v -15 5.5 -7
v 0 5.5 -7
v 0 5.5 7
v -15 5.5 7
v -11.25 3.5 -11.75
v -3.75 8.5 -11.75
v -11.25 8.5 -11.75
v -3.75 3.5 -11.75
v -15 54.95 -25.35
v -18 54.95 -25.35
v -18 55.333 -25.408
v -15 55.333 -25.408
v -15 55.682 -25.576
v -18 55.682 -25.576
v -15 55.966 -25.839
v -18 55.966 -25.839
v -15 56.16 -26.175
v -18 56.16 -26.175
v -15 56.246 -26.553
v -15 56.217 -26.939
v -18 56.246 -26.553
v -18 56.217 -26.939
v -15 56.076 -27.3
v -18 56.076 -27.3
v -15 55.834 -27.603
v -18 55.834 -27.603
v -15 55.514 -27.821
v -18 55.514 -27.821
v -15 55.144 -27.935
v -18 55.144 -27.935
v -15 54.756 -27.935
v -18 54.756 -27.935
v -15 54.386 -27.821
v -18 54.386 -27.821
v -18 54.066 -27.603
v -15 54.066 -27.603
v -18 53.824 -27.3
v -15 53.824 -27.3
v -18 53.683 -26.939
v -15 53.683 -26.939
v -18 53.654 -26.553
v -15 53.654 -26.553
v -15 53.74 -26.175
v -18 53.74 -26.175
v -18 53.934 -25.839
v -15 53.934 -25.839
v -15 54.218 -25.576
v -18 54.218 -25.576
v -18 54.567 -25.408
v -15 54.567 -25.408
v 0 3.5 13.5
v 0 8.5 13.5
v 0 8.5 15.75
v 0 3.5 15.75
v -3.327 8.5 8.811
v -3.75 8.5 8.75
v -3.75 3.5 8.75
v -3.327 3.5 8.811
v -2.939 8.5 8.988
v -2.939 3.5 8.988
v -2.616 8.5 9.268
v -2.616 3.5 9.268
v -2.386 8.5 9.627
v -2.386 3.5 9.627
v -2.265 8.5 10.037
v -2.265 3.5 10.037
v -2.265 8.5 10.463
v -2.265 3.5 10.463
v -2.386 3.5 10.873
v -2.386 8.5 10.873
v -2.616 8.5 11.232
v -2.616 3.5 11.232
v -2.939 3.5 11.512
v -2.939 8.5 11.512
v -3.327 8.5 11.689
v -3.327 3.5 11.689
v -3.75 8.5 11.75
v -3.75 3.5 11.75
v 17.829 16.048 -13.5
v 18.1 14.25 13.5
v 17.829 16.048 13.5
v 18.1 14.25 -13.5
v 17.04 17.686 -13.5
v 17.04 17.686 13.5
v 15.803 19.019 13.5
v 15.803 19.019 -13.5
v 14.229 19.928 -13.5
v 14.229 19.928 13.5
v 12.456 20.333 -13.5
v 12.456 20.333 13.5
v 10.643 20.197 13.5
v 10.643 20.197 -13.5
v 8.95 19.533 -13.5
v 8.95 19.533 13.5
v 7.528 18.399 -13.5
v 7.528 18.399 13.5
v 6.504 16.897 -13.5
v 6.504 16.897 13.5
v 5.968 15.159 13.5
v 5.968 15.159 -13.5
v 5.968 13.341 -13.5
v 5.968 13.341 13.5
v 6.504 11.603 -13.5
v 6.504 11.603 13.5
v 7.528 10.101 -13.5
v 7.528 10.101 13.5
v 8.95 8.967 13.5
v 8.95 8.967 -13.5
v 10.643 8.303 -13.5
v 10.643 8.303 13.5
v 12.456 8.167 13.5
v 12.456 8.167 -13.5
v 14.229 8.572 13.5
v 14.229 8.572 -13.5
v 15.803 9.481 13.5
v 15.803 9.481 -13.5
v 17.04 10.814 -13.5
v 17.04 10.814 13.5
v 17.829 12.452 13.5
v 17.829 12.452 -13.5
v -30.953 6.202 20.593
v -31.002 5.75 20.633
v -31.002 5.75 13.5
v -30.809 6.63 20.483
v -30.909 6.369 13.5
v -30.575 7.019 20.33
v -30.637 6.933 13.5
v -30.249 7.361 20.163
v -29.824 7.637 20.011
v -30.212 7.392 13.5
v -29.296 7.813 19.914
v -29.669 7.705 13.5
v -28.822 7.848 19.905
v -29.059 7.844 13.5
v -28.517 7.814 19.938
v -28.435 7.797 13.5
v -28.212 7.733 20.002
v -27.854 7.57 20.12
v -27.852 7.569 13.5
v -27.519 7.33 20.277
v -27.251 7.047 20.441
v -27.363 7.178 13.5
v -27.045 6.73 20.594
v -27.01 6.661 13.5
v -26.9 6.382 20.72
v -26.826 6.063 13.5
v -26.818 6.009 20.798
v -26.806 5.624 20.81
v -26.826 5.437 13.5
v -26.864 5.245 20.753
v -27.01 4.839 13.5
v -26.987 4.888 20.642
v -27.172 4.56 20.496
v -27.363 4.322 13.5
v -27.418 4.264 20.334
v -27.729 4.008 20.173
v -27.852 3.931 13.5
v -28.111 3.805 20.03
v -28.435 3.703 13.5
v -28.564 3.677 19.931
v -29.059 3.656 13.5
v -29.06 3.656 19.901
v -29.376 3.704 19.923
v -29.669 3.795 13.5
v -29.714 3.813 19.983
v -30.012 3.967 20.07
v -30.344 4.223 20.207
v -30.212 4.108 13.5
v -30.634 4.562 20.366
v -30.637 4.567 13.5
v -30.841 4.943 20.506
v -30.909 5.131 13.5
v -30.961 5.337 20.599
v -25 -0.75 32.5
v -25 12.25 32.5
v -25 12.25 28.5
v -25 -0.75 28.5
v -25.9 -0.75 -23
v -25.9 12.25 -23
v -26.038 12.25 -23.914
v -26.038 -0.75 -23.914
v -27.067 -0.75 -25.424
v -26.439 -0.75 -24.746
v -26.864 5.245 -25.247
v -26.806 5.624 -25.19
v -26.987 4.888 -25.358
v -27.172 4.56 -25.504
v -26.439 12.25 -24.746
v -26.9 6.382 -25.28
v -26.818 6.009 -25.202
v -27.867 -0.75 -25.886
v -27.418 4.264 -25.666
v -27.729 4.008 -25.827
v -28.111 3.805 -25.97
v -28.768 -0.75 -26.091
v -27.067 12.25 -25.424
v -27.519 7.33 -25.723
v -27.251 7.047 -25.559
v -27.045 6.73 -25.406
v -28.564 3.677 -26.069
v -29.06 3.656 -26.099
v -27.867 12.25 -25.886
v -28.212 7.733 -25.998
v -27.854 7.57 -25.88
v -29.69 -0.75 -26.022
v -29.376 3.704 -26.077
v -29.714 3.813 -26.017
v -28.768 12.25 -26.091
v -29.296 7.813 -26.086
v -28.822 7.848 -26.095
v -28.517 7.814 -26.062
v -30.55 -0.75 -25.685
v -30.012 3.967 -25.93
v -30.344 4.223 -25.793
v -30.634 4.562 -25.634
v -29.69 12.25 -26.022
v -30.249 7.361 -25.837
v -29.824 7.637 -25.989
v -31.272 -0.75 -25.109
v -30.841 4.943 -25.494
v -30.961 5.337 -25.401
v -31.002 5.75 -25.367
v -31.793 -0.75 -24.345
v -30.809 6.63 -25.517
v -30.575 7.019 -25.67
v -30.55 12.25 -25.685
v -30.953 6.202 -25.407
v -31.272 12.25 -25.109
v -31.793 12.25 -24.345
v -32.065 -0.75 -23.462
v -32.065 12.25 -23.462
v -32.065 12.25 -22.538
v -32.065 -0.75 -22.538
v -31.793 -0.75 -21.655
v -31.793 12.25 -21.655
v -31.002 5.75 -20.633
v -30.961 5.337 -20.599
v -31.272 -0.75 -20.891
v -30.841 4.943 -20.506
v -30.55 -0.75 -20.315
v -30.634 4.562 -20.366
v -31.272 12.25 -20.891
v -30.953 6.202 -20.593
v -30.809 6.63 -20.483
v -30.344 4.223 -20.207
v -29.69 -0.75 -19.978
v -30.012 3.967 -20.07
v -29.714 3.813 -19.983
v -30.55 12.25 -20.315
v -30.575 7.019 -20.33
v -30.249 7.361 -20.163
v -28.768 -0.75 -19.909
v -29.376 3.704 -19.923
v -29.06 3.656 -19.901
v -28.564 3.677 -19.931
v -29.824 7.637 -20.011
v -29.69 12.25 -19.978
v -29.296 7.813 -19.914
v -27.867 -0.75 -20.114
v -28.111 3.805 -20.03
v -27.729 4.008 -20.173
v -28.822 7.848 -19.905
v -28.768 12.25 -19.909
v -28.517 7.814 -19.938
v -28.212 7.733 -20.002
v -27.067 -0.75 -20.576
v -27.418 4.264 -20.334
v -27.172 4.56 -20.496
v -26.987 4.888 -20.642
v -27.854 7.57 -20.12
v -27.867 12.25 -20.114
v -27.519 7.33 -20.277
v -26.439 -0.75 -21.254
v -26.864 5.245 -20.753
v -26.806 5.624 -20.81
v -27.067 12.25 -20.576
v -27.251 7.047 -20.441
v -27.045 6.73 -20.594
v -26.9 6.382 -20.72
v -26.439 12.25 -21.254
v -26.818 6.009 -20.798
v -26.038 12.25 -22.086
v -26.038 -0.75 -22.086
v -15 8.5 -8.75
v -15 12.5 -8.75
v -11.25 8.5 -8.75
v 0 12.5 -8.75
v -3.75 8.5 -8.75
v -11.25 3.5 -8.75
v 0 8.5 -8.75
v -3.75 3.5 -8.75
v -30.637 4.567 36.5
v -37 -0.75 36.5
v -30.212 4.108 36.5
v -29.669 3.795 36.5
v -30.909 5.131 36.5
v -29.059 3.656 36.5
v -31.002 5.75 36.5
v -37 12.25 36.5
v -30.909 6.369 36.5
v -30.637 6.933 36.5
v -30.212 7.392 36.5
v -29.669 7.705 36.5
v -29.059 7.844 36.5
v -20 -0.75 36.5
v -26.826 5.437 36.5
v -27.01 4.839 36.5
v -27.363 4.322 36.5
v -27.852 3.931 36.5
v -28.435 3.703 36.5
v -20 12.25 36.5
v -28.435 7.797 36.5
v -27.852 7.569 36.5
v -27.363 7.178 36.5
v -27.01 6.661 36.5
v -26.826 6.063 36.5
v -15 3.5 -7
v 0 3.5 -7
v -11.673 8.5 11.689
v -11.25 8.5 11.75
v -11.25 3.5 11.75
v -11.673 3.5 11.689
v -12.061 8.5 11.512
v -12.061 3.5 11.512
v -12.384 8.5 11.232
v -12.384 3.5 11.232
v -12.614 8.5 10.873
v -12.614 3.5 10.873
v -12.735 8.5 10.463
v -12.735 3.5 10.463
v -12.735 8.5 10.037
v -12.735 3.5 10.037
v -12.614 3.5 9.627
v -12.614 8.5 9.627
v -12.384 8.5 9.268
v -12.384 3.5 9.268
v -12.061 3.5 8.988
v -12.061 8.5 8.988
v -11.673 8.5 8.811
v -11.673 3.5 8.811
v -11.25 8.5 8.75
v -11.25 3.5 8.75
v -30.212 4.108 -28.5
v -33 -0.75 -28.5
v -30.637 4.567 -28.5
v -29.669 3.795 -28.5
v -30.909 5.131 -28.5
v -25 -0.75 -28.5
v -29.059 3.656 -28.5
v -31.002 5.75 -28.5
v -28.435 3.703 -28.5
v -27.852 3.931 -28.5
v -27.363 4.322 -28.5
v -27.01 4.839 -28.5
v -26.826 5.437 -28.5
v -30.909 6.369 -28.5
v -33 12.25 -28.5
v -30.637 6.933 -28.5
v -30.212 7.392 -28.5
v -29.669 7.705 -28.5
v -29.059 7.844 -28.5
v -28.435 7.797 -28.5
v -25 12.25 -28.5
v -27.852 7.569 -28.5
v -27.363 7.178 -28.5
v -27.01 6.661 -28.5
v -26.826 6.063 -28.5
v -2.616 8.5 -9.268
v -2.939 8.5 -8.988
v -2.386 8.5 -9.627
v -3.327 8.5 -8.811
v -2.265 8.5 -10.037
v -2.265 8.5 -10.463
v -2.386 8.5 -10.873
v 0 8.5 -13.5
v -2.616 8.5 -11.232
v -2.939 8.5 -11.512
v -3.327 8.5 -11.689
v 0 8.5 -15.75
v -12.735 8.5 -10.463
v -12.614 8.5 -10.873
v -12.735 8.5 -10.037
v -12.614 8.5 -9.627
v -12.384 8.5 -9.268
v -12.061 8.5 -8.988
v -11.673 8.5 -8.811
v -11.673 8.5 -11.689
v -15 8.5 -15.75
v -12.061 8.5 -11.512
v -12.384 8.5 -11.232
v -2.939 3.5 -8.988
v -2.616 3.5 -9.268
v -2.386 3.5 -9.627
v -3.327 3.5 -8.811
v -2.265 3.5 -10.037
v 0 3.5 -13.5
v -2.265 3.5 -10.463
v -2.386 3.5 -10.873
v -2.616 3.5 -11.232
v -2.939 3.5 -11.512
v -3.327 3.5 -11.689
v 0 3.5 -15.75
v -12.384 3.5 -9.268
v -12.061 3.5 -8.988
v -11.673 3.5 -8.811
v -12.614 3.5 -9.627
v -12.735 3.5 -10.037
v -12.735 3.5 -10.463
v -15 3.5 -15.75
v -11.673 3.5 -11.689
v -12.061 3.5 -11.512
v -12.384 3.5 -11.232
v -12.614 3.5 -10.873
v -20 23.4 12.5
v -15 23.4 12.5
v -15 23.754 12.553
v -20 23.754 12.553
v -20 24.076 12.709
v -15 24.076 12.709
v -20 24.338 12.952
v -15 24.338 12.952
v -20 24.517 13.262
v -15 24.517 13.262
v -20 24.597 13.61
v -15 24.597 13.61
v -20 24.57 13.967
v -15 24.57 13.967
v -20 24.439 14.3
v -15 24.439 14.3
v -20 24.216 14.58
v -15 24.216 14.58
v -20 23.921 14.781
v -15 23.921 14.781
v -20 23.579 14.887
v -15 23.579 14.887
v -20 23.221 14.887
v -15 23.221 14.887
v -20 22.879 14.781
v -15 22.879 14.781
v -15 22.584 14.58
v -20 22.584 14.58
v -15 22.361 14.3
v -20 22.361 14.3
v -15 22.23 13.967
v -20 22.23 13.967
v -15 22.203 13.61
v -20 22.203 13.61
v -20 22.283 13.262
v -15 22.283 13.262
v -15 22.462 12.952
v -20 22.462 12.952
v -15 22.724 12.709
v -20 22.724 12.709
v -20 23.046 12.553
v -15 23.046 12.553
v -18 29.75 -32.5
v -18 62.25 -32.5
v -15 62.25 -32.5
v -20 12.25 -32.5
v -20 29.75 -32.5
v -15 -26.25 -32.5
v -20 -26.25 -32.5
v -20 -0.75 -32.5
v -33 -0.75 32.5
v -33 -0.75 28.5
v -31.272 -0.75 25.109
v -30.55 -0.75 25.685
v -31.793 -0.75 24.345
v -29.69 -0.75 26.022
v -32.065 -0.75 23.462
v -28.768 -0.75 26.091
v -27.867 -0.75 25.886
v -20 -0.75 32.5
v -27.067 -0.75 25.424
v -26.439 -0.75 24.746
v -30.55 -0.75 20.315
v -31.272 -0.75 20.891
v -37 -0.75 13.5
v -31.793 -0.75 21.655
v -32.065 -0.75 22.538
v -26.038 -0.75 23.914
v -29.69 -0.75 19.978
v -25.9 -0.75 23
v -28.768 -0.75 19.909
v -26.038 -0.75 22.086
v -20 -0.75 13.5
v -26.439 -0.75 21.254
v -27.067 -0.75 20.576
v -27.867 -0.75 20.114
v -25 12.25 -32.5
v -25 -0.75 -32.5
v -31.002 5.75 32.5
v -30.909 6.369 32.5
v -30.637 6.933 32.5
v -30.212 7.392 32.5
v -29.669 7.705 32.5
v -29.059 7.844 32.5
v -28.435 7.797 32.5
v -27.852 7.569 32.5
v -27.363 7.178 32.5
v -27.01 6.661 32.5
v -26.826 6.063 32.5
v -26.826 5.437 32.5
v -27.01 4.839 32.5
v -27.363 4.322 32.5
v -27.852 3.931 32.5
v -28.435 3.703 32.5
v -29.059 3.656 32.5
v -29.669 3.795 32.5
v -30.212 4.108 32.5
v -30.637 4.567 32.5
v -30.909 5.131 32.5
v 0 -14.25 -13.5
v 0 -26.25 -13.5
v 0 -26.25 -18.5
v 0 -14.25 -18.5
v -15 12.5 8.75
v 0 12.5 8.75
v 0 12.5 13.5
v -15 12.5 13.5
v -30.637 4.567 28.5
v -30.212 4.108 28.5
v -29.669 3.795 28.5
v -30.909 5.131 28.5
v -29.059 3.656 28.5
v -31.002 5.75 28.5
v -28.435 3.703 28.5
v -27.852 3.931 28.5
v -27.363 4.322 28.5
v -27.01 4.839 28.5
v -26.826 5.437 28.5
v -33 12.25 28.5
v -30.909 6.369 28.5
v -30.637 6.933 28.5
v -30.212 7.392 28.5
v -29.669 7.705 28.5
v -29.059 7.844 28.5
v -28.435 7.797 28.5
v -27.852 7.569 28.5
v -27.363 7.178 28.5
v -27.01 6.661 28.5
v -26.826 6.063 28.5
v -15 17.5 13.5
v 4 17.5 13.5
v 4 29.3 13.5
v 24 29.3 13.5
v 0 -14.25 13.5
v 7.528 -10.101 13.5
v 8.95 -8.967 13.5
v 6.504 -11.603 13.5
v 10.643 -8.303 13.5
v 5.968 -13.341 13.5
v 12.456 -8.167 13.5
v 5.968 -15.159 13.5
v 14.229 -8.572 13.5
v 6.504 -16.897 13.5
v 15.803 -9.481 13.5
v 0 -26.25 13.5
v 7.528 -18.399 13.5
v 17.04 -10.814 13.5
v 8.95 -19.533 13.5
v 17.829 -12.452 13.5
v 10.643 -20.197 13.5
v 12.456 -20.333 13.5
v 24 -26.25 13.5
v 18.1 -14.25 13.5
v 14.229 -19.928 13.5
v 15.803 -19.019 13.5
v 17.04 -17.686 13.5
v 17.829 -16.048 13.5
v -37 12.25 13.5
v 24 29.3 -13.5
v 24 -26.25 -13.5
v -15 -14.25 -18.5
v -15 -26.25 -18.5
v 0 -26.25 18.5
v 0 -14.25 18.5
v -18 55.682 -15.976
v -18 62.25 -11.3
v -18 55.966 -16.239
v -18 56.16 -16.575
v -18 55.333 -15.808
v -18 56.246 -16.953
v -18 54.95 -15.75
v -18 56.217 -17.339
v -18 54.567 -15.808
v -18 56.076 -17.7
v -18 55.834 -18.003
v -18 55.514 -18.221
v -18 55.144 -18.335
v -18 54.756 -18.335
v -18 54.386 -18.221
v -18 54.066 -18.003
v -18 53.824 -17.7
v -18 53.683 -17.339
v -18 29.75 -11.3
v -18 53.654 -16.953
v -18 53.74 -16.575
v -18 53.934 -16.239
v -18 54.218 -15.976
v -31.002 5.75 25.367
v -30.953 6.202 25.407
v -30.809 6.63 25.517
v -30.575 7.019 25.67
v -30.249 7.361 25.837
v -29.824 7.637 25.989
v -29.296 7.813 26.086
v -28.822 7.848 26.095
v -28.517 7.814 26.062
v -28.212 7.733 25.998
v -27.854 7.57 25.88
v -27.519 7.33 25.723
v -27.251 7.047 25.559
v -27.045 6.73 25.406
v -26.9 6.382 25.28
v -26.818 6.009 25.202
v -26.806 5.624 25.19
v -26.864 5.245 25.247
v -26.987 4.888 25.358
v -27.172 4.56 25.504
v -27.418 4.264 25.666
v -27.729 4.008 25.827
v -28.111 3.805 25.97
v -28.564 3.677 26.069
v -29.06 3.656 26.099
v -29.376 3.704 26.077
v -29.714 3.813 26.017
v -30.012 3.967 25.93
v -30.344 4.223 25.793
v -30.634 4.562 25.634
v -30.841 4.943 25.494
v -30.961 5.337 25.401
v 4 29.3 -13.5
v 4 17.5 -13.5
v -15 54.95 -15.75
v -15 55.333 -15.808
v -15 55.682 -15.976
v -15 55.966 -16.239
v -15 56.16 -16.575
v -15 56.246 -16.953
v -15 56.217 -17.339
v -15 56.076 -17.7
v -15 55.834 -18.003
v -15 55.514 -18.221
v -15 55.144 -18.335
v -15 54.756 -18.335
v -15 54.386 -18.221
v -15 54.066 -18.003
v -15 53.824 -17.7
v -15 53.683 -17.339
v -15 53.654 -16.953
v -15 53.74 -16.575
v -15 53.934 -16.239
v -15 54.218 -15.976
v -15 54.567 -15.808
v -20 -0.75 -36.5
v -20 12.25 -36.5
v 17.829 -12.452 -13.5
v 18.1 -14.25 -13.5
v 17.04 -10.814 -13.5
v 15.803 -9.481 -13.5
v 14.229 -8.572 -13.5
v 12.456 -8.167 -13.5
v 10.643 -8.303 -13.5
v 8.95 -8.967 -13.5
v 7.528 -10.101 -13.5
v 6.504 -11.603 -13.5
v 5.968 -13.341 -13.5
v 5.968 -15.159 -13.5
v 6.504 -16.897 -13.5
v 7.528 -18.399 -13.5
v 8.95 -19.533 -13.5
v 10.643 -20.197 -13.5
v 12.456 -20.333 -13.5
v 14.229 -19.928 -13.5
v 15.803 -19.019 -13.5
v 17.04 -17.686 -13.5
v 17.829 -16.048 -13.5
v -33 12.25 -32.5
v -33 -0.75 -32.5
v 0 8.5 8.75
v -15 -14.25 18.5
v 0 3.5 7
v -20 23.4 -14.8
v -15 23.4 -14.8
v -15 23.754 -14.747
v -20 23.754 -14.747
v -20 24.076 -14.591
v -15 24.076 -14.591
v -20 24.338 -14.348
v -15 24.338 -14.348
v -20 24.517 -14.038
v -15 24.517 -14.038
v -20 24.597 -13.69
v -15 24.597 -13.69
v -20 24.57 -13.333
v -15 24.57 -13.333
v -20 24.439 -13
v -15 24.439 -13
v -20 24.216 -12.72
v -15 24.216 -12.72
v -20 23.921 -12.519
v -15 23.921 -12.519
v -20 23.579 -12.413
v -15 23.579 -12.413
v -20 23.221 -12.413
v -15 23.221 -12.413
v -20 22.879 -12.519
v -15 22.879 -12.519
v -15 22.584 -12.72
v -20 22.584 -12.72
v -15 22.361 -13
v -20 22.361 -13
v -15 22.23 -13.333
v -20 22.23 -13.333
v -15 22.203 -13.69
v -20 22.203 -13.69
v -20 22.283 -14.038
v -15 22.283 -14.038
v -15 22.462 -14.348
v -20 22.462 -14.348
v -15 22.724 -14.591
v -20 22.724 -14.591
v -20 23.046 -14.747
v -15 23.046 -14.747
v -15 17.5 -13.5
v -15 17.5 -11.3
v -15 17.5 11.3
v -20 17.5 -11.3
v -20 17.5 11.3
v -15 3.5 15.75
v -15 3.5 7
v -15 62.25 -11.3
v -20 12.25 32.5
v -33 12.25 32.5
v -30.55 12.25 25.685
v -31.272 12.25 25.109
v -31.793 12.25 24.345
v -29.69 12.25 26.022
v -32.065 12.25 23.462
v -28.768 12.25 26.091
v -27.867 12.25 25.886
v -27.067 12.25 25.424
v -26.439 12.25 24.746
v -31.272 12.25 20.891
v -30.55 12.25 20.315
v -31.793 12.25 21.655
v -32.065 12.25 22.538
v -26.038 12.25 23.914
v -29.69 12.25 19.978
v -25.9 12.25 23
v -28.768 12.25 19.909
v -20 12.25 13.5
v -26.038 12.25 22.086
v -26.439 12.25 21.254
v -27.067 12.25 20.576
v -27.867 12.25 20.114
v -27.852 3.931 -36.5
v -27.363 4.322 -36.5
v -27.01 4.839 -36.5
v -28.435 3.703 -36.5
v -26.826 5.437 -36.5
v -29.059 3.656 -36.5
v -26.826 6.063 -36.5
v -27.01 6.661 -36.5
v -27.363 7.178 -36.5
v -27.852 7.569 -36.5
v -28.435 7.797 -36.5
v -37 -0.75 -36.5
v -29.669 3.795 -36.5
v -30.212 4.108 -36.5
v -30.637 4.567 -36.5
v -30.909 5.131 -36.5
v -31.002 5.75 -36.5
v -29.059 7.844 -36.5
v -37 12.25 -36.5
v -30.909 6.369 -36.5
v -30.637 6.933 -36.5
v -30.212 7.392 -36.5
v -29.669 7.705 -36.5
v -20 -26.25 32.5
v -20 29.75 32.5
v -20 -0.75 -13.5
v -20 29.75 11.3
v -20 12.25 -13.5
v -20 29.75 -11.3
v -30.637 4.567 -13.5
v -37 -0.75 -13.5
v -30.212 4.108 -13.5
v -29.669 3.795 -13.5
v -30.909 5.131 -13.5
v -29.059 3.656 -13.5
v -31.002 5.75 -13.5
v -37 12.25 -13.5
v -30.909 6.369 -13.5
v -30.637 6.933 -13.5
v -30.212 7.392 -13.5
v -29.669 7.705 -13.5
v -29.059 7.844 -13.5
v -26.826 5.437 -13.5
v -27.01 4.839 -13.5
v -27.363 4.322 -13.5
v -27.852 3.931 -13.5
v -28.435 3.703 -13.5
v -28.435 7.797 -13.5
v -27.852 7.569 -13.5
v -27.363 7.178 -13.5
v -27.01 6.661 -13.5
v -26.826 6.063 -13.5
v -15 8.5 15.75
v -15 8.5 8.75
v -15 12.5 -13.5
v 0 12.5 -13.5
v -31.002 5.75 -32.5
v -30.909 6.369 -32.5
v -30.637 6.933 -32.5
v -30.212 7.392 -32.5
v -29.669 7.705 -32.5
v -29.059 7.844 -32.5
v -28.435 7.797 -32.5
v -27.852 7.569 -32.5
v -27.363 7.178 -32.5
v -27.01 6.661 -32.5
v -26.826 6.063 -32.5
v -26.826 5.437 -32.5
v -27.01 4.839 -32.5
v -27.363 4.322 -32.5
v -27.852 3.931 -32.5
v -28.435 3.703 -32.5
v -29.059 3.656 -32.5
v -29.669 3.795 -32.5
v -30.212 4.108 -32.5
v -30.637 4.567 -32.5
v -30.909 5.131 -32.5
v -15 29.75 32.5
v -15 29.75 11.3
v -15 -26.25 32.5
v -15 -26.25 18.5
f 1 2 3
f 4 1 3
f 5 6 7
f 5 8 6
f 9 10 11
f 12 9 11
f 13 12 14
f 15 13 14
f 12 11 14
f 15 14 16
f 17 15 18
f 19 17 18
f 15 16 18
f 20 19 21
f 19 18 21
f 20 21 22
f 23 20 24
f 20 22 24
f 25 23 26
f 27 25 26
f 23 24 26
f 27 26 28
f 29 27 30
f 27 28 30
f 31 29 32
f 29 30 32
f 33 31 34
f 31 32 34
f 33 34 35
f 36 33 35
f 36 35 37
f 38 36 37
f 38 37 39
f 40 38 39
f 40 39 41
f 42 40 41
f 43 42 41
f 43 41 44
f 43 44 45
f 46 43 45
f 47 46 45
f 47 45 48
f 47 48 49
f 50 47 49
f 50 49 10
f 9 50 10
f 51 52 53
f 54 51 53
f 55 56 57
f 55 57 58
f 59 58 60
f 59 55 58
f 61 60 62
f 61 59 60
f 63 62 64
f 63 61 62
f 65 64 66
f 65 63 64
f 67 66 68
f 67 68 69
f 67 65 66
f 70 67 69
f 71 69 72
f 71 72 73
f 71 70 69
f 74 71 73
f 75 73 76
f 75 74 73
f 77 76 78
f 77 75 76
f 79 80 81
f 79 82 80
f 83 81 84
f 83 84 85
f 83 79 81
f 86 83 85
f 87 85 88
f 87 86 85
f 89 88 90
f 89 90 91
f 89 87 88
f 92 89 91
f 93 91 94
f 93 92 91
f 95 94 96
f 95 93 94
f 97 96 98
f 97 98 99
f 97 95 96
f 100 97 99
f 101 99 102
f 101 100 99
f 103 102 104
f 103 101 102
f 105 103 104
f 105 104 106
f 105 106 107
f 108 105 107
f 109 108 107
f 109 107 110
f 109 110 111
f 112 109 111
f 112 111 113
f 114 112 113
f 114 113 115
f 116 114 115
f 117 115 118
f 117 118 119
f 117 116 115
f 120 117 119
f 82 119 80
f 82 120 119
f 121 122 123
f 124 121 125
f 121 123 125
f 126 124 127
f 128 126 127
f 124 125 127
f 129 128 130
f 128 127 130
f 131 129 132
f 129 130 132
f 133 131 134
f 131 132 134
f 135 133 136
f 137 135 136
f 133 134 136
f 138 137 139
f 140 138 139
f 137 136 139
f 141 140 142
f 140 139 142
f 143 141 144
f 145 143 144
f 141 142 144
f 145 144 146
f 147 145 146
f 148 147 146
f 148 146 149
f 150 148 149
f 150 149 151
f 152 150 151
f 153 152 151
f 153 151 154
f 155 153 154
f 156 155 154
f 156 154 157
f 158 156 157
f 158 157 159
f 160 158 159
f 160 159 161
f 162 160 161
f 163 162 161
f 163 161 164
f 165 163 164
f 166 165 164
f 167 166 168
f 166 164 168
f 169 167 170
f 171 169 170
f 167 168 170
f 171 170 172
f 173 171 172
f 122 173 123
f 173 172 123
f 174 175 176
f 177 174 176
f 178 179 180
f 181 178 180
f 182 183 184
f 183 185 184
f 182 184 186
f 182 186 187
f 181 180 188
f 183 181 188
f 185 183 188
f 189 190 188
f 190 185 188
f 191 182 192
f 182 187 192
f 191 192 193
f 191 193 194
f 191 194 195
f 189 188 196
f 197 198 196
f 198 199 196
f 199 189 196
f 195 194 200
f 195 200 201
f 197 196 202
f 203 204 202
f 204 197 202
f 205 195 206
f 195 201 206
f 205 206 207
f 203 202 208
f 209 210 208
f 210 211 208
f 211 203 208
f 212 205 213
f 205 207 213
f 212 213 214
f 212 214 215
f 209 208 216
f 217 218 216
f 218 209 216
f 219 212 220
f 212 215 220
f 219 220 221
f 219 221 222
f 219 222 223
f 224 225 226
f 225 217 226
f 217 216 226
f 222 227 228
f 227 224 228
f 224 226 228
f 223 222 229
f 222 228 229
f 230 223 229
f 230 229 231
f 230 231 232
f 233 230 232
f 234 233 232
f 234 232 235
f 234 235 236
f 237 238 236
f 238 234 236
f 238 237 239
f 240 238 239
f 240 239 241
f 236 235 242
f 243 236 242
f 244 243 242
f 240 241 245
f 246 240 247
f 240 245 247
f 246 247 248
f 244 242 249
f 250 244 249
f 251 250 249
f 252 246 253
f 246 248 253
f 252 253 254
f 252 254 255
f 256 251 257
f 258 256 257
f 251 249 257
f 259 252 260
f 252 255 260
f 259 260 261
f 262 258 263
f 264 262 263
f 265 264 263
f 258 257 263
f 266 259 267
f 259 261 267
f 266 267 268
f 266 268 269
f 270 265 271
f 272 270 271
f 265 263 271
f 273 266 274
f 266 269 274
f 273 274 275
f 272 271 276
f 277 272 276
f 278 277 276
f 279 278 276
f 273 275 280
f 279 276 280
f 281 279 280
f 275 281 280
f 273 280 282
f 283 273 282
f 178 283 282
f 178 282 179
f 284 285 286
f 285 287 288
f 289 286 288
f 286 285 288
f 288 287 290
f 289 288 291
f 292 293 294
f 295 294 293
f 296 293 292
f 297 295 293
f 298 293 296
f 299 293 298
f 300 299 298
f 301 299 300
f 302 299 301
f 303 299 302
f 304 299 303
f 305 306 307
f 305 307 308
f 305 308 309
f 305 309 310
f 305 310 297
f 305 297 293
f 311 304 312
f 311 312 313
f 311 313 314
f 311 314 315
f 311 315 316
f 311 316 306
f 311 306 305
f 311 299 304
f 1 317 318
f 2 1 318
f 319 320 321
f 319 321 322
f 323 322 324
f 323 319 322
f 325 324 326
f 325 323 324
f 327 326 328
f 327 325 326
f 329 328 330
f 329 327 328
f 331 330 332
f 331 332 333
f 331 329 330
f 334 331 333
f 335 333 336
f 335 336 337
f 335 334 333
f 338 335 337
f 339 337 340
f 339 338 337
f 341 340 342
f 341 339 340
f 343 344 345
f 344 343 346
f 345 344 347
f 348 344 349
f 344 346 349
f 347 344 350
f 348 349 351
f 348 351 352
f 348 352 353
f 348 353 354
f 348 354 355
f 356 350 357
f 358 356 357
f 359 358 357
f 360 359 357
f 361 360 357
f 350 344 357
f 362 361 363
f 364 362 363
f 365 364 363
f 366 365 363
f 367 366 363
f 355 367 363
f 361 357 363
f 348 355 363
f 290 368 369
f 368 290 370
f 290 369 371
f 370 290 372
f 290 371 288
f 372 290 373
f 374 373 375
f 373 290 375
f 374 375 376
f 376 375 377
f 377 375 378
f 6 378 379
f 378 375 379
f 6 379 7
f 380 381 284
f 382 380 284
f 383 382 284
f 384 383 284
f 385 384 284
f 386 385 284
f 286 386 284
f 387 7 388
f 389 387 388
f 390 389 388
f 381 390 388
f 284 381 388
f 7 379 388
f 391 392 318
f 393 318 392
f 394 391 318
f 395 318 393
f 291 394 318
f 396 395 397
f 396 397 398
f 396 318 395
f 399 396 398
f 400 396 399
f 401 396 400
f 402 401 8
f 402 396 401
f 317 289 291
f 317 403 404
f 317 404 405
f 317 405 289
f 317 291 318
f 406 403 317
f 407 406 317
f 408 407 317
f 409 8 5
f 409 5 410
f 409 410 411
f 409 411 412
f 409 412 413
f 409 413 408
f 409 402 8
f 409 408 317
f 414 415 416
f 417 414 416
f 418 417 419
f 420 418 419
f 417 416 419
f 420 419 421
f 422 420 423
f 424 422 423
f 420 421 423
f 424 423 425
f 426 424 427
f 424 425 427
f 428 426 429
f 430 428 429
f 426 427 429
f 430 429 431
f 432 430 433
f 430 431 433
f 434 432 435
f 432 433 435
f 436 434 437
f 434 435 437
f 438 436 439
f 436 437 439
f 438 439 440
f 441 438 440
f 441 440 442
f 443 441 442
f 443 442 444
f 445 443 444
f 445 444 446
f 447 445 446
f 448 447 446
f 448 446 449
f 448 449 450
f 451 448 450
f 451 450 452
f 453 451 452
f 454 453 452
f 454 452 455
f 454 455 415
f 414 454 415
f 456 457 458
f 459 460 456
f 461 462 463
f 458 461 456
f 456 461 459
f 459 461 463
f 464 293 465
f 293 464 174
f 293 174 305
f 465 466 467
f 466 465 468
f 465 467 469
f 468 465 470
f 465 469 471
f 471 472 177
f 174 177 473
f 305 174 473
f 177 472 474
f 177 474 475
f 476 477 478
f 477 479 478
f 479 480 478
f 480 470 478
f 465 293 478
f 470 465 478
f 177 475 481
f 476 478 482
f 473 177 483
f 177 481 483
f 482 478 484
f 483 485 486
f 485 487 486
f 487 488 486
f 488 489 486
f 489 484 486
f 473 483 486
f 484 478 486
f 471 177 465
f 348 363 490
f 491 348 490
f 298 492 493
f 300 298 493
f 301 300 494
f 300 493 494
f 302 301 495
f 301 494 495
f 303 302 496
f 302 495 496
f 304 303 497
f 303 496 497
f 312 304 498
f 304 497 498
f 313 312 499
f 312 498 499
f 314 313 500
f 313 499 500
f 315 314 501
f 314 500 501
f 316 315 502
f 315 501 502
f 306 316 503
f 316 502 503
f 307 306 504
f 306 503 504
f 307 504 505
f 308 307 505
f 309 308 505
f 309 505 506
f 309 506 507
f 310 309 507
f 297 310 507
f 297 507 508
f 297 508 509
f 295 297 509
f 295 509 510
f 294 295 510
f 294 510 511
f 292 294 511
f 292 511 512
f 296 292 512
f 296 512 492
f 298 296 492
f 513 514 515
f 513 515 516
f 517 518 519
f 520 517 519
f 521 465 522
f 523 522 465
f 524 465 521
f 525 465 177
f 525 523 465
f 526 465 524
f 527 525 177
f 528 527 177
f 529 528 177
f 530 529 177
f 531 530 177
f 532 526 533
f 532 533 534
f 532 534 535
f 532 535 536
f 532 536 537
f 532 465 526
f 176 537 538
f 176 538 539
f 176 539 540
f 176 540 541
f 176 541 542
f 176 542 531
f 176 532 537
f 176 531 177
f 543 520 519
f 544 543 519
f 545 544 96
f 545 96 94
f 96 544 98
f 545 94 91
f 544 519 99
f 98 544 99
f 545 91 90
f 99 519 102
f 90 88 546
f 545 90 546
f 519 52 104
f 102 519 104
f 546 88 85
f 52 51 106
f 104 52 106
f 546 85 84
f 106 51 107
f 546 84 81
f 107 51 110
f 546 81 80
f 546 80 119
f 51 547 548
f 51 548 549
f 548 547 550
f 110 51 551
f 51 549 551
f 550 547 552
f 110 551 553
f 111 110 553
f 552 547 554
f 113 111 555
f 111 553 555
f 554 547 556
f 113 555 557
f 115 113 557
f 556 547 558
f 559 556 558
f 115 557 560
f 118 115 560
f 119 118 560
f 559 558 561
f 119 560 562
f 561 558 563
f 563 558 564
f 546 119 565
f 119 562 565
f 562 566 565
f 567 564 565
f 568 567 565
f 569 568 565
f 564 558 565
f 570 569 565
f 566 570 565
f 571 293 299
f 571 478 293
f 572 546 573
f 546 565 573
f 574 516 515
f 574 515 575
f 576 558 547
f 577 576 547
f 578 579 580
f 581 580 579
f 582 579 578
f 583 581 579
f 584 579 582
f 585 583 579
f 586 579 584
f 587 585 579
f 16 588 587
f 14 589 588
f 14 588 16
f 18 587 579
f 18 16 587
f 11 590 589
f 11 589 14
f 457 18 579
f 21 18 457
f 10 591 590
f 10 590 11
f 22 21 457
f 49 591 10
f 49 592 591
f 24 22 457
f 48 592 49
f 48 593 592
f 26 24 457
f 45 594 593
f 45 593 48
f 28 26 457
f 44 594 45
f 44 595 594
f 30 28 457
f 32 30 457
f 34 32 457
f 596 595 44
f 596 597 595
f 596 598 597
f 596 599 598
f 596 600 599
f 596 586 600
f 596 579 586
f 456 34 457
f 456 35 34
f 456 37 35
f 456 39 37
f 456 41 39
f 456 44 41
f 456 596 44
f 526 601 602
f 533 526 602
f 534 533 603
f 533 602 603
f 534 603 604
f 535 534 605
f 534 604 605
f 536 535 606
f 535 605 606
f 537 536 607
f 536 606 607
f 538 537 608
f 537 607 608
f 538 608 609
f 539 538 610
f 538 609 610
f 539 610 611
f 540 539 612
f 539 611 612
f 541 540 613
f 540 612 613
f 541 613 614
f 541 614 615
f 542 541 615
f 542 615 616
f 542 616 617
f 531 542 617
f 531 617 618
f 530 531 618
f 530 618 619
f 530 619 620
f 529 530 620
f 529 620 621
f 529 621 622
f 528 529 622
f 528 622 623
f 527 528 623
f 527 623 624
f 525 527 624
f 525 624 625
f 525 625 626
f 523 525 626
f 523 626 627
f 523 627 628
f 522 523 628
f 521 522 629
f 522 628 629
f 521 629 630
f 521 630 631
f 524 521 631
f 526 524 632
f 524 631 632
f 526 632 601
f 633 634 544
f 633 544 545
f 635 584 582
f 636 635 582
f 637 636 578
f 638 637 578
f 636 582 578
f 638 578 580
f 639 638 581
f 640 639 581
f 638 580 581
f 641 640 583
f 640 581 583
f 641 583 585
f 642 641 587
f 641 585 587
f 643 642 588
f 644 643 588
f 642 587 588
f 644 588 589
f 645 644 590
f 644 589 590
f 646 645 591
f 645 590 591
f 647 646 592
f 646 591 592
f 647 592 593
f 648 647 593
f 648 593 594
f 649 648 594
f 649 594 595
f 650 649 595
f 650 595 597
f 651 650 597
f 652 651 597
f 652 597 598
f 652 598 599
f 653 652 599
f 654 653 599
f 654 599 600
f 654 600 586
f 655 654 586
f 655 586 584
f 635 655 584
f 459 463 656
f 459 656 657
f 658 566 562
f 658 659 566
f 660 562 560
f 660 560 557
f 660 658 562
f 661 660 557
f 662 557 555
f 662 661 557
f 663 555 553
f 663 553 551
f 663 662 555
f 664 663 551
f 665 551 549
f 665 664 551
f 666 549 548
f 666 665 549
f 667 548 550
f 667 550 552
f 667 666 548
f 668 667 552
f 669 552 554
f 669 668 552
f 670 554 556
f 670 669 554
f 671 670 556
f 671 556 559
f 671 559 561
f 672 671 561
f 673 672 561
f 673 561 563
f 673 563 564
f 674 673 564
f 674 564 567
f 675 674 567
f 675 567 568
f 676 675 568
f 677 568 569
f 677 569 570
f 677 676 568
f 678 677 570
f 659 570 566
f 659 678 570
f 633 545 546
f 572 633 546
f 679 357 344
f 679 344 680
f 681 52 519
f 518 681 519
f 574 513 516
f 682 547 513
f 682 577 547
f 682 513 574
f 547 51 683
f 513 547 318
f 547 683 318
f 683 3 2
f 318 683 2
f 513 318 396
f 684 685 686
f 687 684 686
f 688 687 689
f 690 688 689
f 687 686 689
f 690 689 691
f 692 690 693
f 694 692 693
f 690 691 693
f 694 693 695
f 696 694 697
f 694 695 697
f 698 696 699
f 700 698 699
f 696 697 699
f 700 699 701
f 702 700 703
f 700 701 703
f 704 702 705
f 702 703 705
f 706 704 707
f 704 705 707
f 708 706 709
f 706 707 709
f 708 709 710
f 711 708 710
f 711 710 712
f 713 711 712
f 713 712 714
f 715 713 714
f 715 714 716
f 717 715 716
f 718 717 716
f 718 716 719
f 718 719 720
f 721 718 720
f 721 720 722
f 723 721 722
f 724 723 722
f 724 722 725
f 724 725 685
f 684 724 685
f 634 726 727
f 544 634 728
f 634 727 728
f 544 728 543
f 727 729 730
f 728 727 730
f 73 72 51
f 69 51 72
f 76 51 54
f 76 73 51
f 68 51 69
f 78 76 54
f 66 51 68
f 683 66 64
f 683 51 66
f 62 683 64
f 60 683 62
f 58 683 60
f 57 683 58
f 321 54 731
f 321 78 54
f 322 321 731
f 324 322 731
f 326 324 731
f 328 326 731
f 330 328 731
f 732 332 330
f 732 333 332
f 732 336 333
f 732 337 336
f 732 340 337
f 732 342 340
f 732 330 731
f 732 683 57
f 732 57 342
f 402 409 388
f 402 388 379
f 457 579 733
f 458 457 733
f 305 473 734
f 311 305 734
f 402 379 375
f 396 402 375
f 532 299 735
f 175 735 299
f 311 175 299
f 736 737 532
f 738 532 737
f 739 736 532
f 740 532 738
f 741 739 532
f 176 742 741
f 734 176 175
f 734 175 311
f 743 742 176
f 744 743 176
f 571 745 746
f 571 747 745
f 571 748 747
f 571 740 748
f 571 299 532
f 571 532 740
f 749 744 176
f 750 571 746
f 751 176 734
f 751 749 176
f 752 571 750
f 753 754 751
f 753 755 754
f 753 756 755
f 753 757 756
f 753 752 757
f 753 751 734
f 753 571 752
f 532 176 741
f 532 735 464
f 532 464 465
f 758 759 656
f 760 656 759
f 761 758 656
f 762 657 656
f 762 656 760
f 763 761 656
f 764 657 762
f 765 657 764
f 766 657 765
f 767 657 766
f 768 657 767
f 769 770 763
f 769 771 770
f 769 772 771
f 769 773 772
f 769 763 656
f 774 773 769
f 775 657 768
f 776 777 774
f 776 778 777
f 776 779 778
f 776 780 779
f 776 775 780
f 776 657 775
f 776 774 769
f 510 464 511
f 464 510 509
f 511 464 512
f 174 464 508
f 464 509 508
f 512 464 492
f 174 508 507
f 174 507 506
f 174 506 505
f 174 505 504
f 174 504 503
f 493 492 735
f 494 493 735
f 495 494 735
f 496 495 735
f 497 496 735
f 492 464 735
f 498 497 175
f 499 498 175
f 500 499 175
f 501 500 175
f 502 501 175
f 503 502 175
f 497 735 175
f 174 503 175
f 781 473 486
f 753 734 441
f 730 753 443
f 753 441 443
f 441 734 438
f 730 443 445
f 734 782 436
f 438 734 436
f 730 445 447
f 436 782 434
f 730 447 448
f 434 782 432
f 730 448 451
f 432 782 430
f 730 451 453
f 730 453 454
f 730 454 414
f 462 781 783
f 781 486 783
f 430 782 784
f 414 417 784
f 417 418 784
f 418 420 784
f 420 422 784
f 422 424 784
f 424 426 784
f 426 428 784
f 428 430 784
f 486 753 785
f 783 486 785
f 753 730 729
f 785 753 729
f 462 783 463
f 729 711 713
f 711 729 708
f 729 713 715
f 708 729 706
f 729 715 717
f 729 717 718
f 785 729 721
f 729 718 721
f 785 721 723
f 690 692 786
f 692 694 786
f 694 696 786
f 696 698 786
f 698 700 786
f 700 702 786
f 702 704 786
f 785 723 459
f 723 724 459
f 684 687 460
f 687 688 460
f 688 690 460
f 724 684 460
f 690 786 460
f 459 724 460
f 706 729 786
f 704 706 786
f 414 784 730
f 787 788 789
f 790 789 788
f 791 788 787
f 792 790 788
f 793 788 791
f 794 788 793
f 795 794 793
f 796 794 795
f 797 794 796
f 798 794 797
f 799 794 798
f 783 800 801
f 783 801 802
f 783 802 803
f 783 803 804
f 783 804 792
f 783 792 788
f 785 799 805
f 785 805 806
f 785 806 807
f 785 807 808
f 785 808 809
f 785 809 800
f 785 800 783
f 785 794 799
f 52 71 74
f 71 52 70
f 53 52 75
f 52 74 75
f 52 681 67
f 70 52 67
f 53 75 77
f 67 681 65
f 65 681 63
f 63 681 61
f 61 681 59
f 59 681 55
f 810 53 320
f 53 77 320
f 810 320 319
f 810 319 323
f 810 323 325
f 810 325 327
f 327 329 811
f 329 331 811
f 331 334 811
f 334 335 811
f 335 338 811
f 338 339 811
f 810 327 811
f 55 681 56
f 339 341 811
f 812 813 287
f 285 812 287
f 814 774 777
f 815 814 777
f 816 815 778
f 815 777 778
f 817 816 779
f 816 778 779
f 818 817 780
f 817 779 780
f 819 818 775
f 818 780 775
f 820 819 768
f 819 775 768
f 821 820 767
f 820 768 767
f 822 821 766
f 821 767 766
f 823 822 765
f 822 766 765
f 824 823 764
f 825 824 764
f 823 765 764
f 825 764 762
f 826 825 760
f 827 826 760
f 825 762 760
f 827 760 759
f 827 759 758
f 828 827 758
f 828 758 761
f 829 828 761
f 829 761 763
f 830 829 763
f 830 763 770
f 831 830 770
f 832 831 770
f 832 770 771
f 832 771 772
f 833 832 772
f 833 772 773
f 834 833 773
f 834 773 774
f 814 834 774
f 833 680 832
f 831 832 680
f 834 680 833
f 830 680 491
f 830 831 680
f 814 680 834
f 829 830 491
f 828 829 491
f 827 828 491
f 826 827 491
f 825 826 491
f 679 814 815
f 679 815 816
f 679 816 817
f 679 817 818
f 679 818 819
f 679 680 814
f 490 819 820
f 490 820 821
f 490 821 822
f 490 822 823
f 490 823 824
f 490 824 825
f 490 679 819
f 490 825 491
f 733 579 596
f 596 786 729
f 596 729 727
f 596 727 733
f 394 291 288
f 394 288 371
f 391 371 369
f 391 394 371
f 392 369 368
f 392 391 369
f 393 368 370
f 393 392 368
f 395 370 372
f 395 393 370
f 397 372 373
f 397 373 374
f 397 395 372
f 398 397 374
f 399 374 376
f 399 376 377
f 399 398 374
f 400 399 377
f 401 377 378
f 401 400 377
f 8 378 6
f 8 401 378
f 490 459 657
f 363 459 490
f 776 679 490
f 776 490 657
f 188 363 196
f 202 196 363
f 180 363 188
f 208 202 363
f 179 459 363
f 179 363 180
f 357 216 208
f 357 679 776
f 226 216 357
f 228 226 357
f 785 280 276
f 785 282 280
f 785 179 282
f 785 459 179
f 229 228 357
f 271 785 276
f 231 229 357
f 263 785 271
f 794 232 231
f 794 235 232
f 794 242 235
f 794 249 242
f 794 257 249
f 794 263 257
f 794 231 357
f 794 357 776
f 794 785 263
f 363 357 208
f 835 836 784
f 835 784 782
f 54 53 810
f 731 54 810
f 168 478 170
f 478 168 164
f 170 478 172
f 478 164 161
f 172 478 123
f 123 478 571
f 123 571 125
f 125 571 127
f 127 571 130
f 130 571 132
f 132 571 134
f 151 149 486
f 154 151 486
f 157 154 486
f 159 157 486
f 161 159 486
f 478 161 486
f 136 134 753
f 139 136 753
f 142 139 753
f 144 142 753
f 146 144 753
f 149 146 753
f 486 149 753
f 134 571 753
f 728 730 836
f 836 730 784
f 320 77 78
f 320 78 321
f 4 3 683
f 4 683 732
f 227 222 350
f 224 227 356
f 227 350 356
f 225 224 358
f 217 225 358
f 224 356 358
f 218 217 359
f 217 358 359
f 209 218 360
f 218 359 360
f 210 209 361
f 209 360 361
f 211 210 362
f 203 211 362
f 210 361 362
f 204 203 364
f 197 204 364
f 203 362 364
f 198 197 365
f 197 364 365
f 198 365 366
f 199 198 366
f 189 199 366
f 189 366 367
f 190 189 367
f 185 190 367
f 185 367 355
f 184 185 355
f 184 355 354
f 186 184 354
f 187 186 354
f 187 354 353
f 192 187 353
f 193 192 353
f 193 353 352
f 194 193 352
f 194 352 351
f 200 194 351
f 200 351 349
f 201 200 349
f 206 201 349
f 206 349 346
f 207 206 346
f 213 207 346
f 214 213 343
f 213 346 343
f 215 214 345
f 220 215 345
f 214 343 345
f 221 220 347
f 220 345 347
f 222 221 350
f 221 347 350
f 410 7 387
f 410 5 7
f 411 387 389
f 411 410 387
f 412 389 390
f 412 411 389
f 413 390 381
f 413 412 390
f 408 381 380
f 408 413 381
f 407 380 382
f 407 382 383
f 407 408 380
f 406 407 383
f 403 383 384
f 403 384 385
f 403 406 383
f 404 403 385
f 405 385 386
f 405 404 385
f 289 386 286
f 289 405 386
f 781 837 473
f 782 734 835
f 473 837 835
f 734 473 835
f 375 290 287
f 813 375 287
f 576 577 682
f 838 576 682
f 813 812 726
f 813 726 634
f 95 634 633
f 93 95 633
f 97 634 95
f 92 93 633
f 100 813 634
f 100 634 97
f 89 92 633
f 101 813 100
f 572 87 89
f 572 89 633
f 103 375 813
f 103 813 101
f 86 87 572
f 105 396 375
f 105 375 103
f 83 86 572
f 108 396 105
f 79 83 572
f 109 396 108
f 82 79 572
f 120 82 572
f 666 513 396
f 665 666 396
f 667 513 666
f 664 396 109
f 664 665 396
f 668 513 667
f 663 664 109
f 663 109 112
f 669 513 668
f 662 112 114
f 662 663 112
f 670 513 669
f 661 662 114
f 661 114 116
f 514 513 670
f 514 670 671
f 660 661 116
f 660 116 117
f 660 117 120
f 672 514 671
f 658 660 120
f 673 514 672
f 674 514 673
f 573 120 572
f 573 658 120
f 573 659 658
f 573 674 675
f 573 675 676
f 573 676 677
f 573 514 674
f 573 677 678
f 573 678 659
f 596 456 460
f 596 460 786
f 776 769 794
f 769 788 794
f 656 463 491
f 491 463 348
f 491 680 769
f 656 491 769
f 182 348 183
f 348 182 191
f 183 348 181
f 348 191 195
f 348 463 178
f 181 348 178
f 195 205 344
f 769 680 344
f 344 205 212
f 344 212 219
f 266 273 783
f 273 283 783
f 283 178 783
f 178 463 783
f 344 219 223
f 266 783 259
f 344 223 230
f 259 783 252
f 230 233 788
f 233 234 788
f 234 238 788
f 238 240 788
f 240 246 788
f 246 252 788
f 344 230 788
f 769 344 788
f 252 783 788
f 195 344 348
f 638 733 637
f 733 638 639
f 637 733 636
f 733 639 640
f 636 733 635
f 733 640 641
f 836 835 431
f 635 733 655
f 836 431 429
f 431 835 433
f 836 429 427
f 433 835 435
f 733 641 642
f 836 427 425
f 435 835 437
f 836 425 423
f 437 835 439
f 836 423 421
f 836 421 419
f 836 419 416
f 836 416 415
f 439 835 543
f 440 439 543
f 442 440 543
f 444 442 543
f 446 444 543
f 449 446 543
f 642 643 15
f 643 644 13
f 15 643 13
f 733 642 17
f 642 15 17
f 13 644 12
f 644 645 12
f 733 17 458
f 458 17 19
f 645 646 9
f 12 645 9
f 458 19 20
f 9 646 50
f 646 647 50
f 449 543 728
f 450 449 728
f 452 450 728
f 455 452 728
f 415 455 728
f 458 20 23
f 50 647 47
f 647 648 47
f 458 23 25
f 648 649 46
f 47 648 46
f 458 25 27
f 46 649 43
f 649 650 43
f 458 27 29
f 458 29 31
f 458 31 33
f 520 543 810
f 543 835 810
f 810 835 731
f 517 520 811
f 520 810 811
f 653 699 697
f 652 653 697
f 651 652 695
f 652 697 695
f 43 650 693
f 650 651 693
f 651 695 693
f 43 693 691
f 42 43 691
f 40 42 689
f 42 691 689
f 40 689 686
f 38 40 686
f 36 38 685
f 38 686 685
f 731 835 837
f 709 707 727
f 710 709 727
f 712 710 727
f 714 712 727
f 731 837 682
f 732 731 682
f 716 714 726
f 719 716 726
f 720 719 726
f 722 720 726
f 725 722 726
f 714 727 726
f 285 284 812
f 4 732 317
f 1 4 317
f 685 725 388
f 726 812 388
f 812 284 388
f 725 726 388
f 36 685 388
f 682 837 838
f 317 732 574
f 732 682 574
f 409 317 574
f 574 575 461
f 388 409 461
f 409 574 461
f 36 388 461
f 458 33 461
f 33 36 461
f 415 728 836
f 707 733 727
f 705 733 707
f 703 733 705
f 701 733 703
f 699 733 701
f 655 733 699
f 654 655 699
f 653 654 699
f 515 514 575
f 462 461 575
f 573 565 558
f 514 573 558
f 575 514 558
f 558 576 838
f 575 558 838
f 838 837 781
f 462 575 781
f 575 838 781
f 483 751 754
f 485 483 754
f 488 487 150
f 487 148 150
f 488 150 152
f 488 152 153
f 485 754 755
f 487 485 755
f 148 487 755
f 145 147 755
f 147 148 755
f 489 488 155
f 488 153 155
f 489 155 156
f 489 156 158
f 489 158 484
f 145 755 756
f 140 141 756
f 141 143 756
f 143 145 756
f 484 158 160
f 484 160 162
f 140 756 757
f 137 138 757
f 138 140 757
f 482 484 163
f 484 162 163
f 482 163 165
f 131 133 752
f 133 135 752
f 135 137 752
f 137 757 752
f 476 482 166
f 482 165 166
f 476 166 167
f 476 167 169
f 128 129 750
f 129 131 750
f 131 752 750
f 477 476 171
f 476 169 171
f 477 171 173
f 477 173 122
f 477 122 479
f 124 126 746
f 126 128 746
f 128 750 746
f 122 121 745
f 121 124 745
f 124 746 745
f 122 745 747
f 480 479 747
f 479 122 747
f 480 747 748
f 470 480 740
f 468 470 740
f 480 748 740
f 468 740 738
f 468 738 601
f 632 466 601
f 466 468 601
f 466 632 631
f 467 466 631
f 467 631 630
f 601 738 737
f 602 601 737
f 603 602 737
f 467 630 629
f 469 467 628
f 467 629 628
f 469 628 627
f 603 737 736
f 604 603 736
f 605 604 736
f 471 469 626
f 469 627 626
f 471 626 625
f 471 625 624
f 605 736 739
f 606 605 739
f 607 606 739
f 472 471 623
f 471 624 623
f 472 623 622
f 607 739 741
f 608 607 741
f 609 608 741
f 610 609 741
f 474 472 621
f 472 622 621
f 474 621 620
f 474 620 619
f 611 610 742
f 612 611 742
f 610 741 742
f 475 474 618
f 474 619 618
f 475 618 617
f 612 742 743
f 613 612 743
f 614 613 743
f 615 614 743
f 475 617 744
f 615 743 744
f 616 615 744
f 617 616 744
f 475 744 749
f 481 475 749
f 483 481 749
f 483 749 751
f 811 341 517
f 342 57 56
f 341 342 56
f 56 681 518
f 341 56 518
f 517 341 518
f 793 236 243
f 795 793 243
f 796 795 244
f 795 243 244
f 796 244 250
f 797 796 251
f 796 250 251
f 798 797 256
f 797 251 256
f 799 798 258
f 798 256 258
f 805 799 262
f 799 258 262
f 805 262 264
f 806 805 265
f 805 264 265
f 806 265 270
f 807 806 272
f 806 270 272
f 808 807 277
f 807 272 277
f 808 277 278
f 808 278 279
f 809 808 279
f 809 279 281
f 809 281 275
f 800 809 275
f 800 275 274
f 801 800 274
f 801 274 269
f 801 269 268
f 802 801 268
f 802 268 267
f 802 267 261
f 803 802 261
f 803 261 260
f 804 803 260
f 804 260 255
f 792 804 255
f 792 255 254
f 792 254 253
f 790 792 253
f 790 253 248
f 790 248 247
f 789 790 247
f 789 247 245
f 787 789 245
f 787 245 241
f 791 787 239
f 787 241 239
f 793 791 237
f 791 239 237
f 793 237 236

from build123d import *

# Parameters (mm, degrees)
SKETCH1_W                = 24
SKETCH1_H                = 52.5
SKETCH1_R                = 6.1
BOSS_EXTRUDE1_DEPTH      = 13.5
BOSS_EXTRUDE2_DEPTH      = 3
BOSS_EXTRUDE2_DEPTH_BACK = 2
SKETCH3_W                = 27
SKETCH3_H                = 18
BOSS_EXTRUDE3_DEPTH      = 15
SKETCH4_W                = 32
SKETCH4_H                = 12
CUT_EXTRUDE2_DEPTH       = 18
SKETCH6_W                = 65
SKETCH6_H                = 56
BOSS_EXTRUDE4_DEPTH      = 22
SKETCH7_R                = 3.1
CUT_EXTRUDE3_DEPTH       = 57
SKETCH8_W                = 17
SKETCH8_H                = 65
CUT_EXTRUDE4_DEPTH       = 17.5
SKETCH11_W               = 22.6
SKETCH11_H               = 12.25
CUT_EXTRUDE6_DEPTH       = 5
SKETCH12_W               = 17
SKETCH12_H               = 27
CUT_EXTRUDE7_DEPTH       = 39.5
SKETCH13_W               = 17
SKETCH13_H               = 65
CUT_EXTRUDE8_DEPTH       = 25.5
SKETCH16_W               = 15
SKETCH16_H               = 27
CUT_EXTRUDE9_DEPTH       = 6
SKETCH17_W               = 15
SKETCH17_H               = 12
BOSS_EXTRUDE5_DEPTH      = 5
BOSS_EXTRUDE5_DEPTH_BACK = 32
SKETCH19_W               = 21
SKETCH19_H               = 27
BOSS_EXTRUDE6_DEPTH      = 3.05
SKETCH20_W               = 1
SKETCH20_H               = 11.8
CUT_EXTRUDE11_DEPTH      = 47
SKETCH21_R               = 1.2
CUT_EXTRUDE12_DEPTH      = 10
SKETCH23_W               = 17
SKETCH23_H               = 13
BOSS_EXTRUDE7_DEPTH      = 4
SKETCH24_W               = 17
SKETCH24_H               = 13
BOSS_EXTRUDE8_DEPTH      = 4
SKETCH25_R               = 2.1
CUT_EXTRUDE14_DEPTH      = 74
SKETCH26_W               = 8
SKETCH26_H               = 4
CUT_EXTRUDE15_DEPTH      = 39.5
SKETCH27_W               = 3
SKETCH27_H               = 21.2
BOSS_EXTRUDE9_DEPTH      = 32.5
SKETCH28_R               = 1.3
CUT_EXTRUDE16_DEPTH      = 43


with BuildPart() as part:
    # Sketch1 → Boss-Extrude1 (new body, symmetric)
    with BuildSketch(Plane.XY):
        with Locations((12, 0)):
            Rectangle(SKETCH1_W, SKETCH1_H)
        with Locations((12, 14.25)):
            Circle(SKETCH1_R, mode=Mode.SUBTRACT)
        with Locations((12, -14.25)):
            Circle(SKETCH1_R, mode=Mode.SUBTRACT)
    extrude(amount=BOSS_EXTRUDE1_DEPTH, both=True)

    # Sketch2 → Boss-Extrude2 (add, two sides)
    with BuildSketch(Plane(origin=(0, 5.5, 0), x_dir=(1, 0, 0), z_dir=(0, 1, 0))) as boss_extrude2_sk:
        Polygon((-4, -7), (0, -7), (0, -15.75), (-15, -15.75), (-15, -7), (-11, -7), align=None)
        with BuildLine():
            Line((-11.25, -8.75), (-3.75, -8.75))
            ThreePointArc((-3.75, -8.75), (-2.25, -10.25), (-3.75, -11.75))
            Line((-3.75, -11.75), (-11.25, -11.75))
            ThreePointArc((-11.25, -11.75), (-12.75, -10.25), (-11.25, -8.75))
        make_face(mode=Mode.SUBTRACT)
        Polygon((-4, 7), (-11, 7), (-15, 7), (-15, 15.75), (0, 15.75), (0, 7), align=None)
        with BuildLine():
            ThreePointArc((-3.75, 8.75), (-2.25, 10.25), (-3.75, 11.75))
            Line((-3.75, 11.75), (-11.25, 11.75))
            ThreePointArc((-11.25, 11.75), (-12.75, 10.25), (-11.25, 8.75))
            Line((-11.25, 8.75), (-3.75, 8.75))
        make_face(mode=Mode.SUBTRACT)
    extrude(amount=BOSS_EXTRUDE2_DEPTH)
    extrude(boss_extrude2_sk.sketch, amount=-BOSS_EXTRUDE2_DEPTH_BACK)

    # Sketch3 → Boss-Extrude3 (add)
    with BuildSketch(Plane.ZY):
        Polygon((13.5, 26.25), (-13.5, 26.25), (-13.5, 12.5), (-8.75, 12.5), (8.75, 12.5), (13.5, 12.5), align=None)
        Polygon((8.75, 12.5), (-8.75, 12.5), (-8.75, 8.5), (-7, 8.5), (-7, 5.5), (7, 5.5), (7, 8.5), (8.75, 8.5), align=None)
        with Locations((0, -17.25)):
            Rectangle(SKETCH3_W, SKETCH3_H)
    extrude(amount=BOSS_EXTRUDE3_DEPTH)

    # Sketch4 → Cut-Extrude2 (cut)
    with BuildSketch(Plane.ZY.offset(15)):
        with Locations((0, 23.5)):
            Rectangle(SKETCH4_W, SKETCH4_H)
    extrude(amount=-CUT_EXTRUDE2_DEPTH, mode=Mode.SUBTRACT)

    # Sketch6 → Boss-Extrude4 (add)
    with BuildSketch(Plane.ZY.offset(15)):
        with Locations((0, 1.75)):
            Rectangle(SKETCH6_W, SKETCH6_H)
    extrude(amount=BOSS_EXTRUDE4_DEPTH)

    # Sketch7 → Cut-Extrude3 (cut, through all)
    with BuildSketch(Plane(origin=(0, 29.75, 0), x_dir=(1, 0, 0), z_dir=(0, 1, 0))):
        with Locations((-29, 23)):
            Circle(SKETCH7_R)
        with Locations((-29, -23)):
            Circle(SKETCH7_R)
    extrude(amount=-CUT_EXTRUDE3_DEPTH, mode=Mode.SUBTRACT)

    # Sketch8 → Cut-Extrude4 (cut)
    with BuildSketch(Plane(origin=(0, 29.75, 0), x_dir=(1, 0, 0), z_dir=(0, 1, 0))):
        with Locations((-28.5, 0)):
            Rectangle(SKETCH8_W, SKETCH8_H)
    extrude(amount=-CUT_EXTRUDE4_DEPTH, mode=Mode.SUBTRACT)

    # Sketch11 → Cut-Extrude6 (cut)
    with BuildSketch(Plane.ZY.offset(20)):
        with Locations((0, 23.625)):
            Rectangle(SKETCH11_W, SKETCH11_H)
    extrude(amount=-CUT_EXTRUDE6_DEPTH, mode=Mode.SUBTRACT)

    # Sketch12 → Cut-Extrude7 (cut, through all)
    with BuildSketch(Plane(origin=(0, 12.25, 0), x_dir=(1, 0, 0), z_dir=(0, 1, 0))):
        with Locations((-28.5, 0)):
            Rectangle(SKETCH12_W, SKETCH12_H)
    extrude(amount=-CUT_EXTRUDE7_DEPTH, mode=Mode.SUBTRACT)

    # Sketch13 → Cut-Extrude8 (cut)
    with BuildSketch(Plane.XZ.offset(26.25)):
        with Locations((-28.5, 0)):
            Rectangle(SKETCH13_W, SKETCH13_H)
    extrude(amount=-CUT_EXTRUDE8_DEPTH, mode=Mode.SUBTRACT)

    # Sketch16 → Cut-Extrude9 (cut)
    with BuildSketch(Plane(origin=(0, -8.25, 0), x_dir=(1, 0, 0), z_dir=(0, 1, 0))):
        with Locations((-7.5, 0)):
            Rectangle(SKETCH16_W, SKETCH16_H)
    extrude(amount=-CUT_EXTRUDE9_DEPTH, mode=Mode.SUBTRACT)

    # Sketch17 → Boss-Extrude5 (add, two sides)
    with BuildSketch(Plane(origin=(0, 0, -13.5), x_dir=(-1, 0, 0), z_dir=(0, 0, -1))) as boss_extrude5_sk:
        with Locations((7.5, -20.25)):
            Rectangle(SKETCH17_W, SKETCH17_H)
    extrude(amount=BOSS_EXTRUDE5_DEPTH)
    extrude(boss_extrude5_sk.sketch, amount=-BOSS_EXTRUDE5_DEPTH_BACK)

    # Sketch19 → Boss-Extrude6 (add)
    with BuildSketch(Plane(origin=(0, 26.25, 0), x_dir=(1, 0, 0), z_dir=(0, 1, 0))):
        with Locations((13.5, 0)):
            Rectangle(SKETCH19_W, SKETCH19_H)
    extrude(amount=BOSS_EXTRUDE6_DEPTH)

    # Sketch20 → Cut-Extrude11 (cut, through all)
    with BuildSketch(Plane.XY.offset(13.5)):
        with Locations((3.5, 23.4)):
            Rectangle(SKETCH20_W, SKETCH20_H)
    extrude(amount=-CUT_EXTRUDE11_DEPTH, mode=Mode.SUBTRACT)

    # Sketch21 → Cut-Extrude12 (cut)
    with BuildSketch(Plane(origin=(-15, 0, 0), x_dir=(0, 0, -1), z_dir=(1, 0, 0))):
        with Locations((-13.7, 23.4)):
            Circle(SKETCH21_R)
        with Locations((13.6, 23.4)):
            Circle(SKETCH21_R)
    extrude(amount=-CUT_EXTRUDE12_DEPTH, mode=Mode.SUBTRACT)

    # Sketch23 → Boss-Extrude7 (add)
    with BuildSketch(Plane(origin=(0, 0, -32.5), x_dir=(-1, 0, 0), z_dir=(0, 0, -1))):
        with Locations((28.5, 5.75)):
            Rectangle(SKETCH23_W, SKETCH23_H)
    extrude(amount=BOSS_EXTRUDE7_DEPTH)

    # Sketch24 → Boss-Extrude8 (add)
    with BuildSketch(Plane.XY.offset(32.5)):
        with Locations((-28.5, 5.75)):
            Rectangle(SKETCH24_W, SKETCH24_H)
    extrude(amount=BOSS_EXTRUDE8_DEPTH)

    # Sketch25 → Cut-Extrude14 (cut, through all)
    with BuildSketch(Plane(origin=(0, 0, -36.5), x_dir=(-1, 0, 0), z_dir=(0, 0, -1))):
        with Locations((28.902210775, 5.75)):
            Circle(SKETCH25_R)
    extrude(amount=-CUT_EXTRUDE14_DEPTH, mode=Mode.SUBTRACT)

    # Sketch26 → Cut-Extrude15 (cut, through all)
    with BuildSketch(Plane(origin=(0, 12.25, 0), x_dir=(1, 0, 0), z_dir=(0, 1, 0))):
        with Locations((-29, -30.5)):
            Rectangle(SKETCH26_W, SKETCH26_H)
        with Locations((-29, 30.5)):
            Rectangle(SKETCH26_W, SKETCH26_H)
    extrude(amount=-CUT_EXTRUDE15_DEPTH, mode=Mode.SUBTRACT)

    # Sketch27 → Boss-Extrude9 (add)
    with BuildSketch(Plane(origin=(0, 29.75, 0), x_dir=(1, 0, 0), z_dir=(0, 1, 0))):
        with Locations((-16.5, 21.9)):
            Rectangle(SKETCH27_W, SKETCH27_H)
    extrude(amount=BOSS_EXTRUDE9_DEPTH)

    # Sketch28 → Cut-Extrude16 (cut, through all)
    with BuildSketch(Plane.ZY.offset(18)):
        with Locations((-26.65, 54.95)):
            Circle(SKETCH28_R)
        with Locations((-17.05, 54.95)):
            Circle(SKETCH28_R)
    extrude(amount=-CUT_EXTRUDE16_DEPTH, mode=Mode.SUBTRACT)


solid = part.part
